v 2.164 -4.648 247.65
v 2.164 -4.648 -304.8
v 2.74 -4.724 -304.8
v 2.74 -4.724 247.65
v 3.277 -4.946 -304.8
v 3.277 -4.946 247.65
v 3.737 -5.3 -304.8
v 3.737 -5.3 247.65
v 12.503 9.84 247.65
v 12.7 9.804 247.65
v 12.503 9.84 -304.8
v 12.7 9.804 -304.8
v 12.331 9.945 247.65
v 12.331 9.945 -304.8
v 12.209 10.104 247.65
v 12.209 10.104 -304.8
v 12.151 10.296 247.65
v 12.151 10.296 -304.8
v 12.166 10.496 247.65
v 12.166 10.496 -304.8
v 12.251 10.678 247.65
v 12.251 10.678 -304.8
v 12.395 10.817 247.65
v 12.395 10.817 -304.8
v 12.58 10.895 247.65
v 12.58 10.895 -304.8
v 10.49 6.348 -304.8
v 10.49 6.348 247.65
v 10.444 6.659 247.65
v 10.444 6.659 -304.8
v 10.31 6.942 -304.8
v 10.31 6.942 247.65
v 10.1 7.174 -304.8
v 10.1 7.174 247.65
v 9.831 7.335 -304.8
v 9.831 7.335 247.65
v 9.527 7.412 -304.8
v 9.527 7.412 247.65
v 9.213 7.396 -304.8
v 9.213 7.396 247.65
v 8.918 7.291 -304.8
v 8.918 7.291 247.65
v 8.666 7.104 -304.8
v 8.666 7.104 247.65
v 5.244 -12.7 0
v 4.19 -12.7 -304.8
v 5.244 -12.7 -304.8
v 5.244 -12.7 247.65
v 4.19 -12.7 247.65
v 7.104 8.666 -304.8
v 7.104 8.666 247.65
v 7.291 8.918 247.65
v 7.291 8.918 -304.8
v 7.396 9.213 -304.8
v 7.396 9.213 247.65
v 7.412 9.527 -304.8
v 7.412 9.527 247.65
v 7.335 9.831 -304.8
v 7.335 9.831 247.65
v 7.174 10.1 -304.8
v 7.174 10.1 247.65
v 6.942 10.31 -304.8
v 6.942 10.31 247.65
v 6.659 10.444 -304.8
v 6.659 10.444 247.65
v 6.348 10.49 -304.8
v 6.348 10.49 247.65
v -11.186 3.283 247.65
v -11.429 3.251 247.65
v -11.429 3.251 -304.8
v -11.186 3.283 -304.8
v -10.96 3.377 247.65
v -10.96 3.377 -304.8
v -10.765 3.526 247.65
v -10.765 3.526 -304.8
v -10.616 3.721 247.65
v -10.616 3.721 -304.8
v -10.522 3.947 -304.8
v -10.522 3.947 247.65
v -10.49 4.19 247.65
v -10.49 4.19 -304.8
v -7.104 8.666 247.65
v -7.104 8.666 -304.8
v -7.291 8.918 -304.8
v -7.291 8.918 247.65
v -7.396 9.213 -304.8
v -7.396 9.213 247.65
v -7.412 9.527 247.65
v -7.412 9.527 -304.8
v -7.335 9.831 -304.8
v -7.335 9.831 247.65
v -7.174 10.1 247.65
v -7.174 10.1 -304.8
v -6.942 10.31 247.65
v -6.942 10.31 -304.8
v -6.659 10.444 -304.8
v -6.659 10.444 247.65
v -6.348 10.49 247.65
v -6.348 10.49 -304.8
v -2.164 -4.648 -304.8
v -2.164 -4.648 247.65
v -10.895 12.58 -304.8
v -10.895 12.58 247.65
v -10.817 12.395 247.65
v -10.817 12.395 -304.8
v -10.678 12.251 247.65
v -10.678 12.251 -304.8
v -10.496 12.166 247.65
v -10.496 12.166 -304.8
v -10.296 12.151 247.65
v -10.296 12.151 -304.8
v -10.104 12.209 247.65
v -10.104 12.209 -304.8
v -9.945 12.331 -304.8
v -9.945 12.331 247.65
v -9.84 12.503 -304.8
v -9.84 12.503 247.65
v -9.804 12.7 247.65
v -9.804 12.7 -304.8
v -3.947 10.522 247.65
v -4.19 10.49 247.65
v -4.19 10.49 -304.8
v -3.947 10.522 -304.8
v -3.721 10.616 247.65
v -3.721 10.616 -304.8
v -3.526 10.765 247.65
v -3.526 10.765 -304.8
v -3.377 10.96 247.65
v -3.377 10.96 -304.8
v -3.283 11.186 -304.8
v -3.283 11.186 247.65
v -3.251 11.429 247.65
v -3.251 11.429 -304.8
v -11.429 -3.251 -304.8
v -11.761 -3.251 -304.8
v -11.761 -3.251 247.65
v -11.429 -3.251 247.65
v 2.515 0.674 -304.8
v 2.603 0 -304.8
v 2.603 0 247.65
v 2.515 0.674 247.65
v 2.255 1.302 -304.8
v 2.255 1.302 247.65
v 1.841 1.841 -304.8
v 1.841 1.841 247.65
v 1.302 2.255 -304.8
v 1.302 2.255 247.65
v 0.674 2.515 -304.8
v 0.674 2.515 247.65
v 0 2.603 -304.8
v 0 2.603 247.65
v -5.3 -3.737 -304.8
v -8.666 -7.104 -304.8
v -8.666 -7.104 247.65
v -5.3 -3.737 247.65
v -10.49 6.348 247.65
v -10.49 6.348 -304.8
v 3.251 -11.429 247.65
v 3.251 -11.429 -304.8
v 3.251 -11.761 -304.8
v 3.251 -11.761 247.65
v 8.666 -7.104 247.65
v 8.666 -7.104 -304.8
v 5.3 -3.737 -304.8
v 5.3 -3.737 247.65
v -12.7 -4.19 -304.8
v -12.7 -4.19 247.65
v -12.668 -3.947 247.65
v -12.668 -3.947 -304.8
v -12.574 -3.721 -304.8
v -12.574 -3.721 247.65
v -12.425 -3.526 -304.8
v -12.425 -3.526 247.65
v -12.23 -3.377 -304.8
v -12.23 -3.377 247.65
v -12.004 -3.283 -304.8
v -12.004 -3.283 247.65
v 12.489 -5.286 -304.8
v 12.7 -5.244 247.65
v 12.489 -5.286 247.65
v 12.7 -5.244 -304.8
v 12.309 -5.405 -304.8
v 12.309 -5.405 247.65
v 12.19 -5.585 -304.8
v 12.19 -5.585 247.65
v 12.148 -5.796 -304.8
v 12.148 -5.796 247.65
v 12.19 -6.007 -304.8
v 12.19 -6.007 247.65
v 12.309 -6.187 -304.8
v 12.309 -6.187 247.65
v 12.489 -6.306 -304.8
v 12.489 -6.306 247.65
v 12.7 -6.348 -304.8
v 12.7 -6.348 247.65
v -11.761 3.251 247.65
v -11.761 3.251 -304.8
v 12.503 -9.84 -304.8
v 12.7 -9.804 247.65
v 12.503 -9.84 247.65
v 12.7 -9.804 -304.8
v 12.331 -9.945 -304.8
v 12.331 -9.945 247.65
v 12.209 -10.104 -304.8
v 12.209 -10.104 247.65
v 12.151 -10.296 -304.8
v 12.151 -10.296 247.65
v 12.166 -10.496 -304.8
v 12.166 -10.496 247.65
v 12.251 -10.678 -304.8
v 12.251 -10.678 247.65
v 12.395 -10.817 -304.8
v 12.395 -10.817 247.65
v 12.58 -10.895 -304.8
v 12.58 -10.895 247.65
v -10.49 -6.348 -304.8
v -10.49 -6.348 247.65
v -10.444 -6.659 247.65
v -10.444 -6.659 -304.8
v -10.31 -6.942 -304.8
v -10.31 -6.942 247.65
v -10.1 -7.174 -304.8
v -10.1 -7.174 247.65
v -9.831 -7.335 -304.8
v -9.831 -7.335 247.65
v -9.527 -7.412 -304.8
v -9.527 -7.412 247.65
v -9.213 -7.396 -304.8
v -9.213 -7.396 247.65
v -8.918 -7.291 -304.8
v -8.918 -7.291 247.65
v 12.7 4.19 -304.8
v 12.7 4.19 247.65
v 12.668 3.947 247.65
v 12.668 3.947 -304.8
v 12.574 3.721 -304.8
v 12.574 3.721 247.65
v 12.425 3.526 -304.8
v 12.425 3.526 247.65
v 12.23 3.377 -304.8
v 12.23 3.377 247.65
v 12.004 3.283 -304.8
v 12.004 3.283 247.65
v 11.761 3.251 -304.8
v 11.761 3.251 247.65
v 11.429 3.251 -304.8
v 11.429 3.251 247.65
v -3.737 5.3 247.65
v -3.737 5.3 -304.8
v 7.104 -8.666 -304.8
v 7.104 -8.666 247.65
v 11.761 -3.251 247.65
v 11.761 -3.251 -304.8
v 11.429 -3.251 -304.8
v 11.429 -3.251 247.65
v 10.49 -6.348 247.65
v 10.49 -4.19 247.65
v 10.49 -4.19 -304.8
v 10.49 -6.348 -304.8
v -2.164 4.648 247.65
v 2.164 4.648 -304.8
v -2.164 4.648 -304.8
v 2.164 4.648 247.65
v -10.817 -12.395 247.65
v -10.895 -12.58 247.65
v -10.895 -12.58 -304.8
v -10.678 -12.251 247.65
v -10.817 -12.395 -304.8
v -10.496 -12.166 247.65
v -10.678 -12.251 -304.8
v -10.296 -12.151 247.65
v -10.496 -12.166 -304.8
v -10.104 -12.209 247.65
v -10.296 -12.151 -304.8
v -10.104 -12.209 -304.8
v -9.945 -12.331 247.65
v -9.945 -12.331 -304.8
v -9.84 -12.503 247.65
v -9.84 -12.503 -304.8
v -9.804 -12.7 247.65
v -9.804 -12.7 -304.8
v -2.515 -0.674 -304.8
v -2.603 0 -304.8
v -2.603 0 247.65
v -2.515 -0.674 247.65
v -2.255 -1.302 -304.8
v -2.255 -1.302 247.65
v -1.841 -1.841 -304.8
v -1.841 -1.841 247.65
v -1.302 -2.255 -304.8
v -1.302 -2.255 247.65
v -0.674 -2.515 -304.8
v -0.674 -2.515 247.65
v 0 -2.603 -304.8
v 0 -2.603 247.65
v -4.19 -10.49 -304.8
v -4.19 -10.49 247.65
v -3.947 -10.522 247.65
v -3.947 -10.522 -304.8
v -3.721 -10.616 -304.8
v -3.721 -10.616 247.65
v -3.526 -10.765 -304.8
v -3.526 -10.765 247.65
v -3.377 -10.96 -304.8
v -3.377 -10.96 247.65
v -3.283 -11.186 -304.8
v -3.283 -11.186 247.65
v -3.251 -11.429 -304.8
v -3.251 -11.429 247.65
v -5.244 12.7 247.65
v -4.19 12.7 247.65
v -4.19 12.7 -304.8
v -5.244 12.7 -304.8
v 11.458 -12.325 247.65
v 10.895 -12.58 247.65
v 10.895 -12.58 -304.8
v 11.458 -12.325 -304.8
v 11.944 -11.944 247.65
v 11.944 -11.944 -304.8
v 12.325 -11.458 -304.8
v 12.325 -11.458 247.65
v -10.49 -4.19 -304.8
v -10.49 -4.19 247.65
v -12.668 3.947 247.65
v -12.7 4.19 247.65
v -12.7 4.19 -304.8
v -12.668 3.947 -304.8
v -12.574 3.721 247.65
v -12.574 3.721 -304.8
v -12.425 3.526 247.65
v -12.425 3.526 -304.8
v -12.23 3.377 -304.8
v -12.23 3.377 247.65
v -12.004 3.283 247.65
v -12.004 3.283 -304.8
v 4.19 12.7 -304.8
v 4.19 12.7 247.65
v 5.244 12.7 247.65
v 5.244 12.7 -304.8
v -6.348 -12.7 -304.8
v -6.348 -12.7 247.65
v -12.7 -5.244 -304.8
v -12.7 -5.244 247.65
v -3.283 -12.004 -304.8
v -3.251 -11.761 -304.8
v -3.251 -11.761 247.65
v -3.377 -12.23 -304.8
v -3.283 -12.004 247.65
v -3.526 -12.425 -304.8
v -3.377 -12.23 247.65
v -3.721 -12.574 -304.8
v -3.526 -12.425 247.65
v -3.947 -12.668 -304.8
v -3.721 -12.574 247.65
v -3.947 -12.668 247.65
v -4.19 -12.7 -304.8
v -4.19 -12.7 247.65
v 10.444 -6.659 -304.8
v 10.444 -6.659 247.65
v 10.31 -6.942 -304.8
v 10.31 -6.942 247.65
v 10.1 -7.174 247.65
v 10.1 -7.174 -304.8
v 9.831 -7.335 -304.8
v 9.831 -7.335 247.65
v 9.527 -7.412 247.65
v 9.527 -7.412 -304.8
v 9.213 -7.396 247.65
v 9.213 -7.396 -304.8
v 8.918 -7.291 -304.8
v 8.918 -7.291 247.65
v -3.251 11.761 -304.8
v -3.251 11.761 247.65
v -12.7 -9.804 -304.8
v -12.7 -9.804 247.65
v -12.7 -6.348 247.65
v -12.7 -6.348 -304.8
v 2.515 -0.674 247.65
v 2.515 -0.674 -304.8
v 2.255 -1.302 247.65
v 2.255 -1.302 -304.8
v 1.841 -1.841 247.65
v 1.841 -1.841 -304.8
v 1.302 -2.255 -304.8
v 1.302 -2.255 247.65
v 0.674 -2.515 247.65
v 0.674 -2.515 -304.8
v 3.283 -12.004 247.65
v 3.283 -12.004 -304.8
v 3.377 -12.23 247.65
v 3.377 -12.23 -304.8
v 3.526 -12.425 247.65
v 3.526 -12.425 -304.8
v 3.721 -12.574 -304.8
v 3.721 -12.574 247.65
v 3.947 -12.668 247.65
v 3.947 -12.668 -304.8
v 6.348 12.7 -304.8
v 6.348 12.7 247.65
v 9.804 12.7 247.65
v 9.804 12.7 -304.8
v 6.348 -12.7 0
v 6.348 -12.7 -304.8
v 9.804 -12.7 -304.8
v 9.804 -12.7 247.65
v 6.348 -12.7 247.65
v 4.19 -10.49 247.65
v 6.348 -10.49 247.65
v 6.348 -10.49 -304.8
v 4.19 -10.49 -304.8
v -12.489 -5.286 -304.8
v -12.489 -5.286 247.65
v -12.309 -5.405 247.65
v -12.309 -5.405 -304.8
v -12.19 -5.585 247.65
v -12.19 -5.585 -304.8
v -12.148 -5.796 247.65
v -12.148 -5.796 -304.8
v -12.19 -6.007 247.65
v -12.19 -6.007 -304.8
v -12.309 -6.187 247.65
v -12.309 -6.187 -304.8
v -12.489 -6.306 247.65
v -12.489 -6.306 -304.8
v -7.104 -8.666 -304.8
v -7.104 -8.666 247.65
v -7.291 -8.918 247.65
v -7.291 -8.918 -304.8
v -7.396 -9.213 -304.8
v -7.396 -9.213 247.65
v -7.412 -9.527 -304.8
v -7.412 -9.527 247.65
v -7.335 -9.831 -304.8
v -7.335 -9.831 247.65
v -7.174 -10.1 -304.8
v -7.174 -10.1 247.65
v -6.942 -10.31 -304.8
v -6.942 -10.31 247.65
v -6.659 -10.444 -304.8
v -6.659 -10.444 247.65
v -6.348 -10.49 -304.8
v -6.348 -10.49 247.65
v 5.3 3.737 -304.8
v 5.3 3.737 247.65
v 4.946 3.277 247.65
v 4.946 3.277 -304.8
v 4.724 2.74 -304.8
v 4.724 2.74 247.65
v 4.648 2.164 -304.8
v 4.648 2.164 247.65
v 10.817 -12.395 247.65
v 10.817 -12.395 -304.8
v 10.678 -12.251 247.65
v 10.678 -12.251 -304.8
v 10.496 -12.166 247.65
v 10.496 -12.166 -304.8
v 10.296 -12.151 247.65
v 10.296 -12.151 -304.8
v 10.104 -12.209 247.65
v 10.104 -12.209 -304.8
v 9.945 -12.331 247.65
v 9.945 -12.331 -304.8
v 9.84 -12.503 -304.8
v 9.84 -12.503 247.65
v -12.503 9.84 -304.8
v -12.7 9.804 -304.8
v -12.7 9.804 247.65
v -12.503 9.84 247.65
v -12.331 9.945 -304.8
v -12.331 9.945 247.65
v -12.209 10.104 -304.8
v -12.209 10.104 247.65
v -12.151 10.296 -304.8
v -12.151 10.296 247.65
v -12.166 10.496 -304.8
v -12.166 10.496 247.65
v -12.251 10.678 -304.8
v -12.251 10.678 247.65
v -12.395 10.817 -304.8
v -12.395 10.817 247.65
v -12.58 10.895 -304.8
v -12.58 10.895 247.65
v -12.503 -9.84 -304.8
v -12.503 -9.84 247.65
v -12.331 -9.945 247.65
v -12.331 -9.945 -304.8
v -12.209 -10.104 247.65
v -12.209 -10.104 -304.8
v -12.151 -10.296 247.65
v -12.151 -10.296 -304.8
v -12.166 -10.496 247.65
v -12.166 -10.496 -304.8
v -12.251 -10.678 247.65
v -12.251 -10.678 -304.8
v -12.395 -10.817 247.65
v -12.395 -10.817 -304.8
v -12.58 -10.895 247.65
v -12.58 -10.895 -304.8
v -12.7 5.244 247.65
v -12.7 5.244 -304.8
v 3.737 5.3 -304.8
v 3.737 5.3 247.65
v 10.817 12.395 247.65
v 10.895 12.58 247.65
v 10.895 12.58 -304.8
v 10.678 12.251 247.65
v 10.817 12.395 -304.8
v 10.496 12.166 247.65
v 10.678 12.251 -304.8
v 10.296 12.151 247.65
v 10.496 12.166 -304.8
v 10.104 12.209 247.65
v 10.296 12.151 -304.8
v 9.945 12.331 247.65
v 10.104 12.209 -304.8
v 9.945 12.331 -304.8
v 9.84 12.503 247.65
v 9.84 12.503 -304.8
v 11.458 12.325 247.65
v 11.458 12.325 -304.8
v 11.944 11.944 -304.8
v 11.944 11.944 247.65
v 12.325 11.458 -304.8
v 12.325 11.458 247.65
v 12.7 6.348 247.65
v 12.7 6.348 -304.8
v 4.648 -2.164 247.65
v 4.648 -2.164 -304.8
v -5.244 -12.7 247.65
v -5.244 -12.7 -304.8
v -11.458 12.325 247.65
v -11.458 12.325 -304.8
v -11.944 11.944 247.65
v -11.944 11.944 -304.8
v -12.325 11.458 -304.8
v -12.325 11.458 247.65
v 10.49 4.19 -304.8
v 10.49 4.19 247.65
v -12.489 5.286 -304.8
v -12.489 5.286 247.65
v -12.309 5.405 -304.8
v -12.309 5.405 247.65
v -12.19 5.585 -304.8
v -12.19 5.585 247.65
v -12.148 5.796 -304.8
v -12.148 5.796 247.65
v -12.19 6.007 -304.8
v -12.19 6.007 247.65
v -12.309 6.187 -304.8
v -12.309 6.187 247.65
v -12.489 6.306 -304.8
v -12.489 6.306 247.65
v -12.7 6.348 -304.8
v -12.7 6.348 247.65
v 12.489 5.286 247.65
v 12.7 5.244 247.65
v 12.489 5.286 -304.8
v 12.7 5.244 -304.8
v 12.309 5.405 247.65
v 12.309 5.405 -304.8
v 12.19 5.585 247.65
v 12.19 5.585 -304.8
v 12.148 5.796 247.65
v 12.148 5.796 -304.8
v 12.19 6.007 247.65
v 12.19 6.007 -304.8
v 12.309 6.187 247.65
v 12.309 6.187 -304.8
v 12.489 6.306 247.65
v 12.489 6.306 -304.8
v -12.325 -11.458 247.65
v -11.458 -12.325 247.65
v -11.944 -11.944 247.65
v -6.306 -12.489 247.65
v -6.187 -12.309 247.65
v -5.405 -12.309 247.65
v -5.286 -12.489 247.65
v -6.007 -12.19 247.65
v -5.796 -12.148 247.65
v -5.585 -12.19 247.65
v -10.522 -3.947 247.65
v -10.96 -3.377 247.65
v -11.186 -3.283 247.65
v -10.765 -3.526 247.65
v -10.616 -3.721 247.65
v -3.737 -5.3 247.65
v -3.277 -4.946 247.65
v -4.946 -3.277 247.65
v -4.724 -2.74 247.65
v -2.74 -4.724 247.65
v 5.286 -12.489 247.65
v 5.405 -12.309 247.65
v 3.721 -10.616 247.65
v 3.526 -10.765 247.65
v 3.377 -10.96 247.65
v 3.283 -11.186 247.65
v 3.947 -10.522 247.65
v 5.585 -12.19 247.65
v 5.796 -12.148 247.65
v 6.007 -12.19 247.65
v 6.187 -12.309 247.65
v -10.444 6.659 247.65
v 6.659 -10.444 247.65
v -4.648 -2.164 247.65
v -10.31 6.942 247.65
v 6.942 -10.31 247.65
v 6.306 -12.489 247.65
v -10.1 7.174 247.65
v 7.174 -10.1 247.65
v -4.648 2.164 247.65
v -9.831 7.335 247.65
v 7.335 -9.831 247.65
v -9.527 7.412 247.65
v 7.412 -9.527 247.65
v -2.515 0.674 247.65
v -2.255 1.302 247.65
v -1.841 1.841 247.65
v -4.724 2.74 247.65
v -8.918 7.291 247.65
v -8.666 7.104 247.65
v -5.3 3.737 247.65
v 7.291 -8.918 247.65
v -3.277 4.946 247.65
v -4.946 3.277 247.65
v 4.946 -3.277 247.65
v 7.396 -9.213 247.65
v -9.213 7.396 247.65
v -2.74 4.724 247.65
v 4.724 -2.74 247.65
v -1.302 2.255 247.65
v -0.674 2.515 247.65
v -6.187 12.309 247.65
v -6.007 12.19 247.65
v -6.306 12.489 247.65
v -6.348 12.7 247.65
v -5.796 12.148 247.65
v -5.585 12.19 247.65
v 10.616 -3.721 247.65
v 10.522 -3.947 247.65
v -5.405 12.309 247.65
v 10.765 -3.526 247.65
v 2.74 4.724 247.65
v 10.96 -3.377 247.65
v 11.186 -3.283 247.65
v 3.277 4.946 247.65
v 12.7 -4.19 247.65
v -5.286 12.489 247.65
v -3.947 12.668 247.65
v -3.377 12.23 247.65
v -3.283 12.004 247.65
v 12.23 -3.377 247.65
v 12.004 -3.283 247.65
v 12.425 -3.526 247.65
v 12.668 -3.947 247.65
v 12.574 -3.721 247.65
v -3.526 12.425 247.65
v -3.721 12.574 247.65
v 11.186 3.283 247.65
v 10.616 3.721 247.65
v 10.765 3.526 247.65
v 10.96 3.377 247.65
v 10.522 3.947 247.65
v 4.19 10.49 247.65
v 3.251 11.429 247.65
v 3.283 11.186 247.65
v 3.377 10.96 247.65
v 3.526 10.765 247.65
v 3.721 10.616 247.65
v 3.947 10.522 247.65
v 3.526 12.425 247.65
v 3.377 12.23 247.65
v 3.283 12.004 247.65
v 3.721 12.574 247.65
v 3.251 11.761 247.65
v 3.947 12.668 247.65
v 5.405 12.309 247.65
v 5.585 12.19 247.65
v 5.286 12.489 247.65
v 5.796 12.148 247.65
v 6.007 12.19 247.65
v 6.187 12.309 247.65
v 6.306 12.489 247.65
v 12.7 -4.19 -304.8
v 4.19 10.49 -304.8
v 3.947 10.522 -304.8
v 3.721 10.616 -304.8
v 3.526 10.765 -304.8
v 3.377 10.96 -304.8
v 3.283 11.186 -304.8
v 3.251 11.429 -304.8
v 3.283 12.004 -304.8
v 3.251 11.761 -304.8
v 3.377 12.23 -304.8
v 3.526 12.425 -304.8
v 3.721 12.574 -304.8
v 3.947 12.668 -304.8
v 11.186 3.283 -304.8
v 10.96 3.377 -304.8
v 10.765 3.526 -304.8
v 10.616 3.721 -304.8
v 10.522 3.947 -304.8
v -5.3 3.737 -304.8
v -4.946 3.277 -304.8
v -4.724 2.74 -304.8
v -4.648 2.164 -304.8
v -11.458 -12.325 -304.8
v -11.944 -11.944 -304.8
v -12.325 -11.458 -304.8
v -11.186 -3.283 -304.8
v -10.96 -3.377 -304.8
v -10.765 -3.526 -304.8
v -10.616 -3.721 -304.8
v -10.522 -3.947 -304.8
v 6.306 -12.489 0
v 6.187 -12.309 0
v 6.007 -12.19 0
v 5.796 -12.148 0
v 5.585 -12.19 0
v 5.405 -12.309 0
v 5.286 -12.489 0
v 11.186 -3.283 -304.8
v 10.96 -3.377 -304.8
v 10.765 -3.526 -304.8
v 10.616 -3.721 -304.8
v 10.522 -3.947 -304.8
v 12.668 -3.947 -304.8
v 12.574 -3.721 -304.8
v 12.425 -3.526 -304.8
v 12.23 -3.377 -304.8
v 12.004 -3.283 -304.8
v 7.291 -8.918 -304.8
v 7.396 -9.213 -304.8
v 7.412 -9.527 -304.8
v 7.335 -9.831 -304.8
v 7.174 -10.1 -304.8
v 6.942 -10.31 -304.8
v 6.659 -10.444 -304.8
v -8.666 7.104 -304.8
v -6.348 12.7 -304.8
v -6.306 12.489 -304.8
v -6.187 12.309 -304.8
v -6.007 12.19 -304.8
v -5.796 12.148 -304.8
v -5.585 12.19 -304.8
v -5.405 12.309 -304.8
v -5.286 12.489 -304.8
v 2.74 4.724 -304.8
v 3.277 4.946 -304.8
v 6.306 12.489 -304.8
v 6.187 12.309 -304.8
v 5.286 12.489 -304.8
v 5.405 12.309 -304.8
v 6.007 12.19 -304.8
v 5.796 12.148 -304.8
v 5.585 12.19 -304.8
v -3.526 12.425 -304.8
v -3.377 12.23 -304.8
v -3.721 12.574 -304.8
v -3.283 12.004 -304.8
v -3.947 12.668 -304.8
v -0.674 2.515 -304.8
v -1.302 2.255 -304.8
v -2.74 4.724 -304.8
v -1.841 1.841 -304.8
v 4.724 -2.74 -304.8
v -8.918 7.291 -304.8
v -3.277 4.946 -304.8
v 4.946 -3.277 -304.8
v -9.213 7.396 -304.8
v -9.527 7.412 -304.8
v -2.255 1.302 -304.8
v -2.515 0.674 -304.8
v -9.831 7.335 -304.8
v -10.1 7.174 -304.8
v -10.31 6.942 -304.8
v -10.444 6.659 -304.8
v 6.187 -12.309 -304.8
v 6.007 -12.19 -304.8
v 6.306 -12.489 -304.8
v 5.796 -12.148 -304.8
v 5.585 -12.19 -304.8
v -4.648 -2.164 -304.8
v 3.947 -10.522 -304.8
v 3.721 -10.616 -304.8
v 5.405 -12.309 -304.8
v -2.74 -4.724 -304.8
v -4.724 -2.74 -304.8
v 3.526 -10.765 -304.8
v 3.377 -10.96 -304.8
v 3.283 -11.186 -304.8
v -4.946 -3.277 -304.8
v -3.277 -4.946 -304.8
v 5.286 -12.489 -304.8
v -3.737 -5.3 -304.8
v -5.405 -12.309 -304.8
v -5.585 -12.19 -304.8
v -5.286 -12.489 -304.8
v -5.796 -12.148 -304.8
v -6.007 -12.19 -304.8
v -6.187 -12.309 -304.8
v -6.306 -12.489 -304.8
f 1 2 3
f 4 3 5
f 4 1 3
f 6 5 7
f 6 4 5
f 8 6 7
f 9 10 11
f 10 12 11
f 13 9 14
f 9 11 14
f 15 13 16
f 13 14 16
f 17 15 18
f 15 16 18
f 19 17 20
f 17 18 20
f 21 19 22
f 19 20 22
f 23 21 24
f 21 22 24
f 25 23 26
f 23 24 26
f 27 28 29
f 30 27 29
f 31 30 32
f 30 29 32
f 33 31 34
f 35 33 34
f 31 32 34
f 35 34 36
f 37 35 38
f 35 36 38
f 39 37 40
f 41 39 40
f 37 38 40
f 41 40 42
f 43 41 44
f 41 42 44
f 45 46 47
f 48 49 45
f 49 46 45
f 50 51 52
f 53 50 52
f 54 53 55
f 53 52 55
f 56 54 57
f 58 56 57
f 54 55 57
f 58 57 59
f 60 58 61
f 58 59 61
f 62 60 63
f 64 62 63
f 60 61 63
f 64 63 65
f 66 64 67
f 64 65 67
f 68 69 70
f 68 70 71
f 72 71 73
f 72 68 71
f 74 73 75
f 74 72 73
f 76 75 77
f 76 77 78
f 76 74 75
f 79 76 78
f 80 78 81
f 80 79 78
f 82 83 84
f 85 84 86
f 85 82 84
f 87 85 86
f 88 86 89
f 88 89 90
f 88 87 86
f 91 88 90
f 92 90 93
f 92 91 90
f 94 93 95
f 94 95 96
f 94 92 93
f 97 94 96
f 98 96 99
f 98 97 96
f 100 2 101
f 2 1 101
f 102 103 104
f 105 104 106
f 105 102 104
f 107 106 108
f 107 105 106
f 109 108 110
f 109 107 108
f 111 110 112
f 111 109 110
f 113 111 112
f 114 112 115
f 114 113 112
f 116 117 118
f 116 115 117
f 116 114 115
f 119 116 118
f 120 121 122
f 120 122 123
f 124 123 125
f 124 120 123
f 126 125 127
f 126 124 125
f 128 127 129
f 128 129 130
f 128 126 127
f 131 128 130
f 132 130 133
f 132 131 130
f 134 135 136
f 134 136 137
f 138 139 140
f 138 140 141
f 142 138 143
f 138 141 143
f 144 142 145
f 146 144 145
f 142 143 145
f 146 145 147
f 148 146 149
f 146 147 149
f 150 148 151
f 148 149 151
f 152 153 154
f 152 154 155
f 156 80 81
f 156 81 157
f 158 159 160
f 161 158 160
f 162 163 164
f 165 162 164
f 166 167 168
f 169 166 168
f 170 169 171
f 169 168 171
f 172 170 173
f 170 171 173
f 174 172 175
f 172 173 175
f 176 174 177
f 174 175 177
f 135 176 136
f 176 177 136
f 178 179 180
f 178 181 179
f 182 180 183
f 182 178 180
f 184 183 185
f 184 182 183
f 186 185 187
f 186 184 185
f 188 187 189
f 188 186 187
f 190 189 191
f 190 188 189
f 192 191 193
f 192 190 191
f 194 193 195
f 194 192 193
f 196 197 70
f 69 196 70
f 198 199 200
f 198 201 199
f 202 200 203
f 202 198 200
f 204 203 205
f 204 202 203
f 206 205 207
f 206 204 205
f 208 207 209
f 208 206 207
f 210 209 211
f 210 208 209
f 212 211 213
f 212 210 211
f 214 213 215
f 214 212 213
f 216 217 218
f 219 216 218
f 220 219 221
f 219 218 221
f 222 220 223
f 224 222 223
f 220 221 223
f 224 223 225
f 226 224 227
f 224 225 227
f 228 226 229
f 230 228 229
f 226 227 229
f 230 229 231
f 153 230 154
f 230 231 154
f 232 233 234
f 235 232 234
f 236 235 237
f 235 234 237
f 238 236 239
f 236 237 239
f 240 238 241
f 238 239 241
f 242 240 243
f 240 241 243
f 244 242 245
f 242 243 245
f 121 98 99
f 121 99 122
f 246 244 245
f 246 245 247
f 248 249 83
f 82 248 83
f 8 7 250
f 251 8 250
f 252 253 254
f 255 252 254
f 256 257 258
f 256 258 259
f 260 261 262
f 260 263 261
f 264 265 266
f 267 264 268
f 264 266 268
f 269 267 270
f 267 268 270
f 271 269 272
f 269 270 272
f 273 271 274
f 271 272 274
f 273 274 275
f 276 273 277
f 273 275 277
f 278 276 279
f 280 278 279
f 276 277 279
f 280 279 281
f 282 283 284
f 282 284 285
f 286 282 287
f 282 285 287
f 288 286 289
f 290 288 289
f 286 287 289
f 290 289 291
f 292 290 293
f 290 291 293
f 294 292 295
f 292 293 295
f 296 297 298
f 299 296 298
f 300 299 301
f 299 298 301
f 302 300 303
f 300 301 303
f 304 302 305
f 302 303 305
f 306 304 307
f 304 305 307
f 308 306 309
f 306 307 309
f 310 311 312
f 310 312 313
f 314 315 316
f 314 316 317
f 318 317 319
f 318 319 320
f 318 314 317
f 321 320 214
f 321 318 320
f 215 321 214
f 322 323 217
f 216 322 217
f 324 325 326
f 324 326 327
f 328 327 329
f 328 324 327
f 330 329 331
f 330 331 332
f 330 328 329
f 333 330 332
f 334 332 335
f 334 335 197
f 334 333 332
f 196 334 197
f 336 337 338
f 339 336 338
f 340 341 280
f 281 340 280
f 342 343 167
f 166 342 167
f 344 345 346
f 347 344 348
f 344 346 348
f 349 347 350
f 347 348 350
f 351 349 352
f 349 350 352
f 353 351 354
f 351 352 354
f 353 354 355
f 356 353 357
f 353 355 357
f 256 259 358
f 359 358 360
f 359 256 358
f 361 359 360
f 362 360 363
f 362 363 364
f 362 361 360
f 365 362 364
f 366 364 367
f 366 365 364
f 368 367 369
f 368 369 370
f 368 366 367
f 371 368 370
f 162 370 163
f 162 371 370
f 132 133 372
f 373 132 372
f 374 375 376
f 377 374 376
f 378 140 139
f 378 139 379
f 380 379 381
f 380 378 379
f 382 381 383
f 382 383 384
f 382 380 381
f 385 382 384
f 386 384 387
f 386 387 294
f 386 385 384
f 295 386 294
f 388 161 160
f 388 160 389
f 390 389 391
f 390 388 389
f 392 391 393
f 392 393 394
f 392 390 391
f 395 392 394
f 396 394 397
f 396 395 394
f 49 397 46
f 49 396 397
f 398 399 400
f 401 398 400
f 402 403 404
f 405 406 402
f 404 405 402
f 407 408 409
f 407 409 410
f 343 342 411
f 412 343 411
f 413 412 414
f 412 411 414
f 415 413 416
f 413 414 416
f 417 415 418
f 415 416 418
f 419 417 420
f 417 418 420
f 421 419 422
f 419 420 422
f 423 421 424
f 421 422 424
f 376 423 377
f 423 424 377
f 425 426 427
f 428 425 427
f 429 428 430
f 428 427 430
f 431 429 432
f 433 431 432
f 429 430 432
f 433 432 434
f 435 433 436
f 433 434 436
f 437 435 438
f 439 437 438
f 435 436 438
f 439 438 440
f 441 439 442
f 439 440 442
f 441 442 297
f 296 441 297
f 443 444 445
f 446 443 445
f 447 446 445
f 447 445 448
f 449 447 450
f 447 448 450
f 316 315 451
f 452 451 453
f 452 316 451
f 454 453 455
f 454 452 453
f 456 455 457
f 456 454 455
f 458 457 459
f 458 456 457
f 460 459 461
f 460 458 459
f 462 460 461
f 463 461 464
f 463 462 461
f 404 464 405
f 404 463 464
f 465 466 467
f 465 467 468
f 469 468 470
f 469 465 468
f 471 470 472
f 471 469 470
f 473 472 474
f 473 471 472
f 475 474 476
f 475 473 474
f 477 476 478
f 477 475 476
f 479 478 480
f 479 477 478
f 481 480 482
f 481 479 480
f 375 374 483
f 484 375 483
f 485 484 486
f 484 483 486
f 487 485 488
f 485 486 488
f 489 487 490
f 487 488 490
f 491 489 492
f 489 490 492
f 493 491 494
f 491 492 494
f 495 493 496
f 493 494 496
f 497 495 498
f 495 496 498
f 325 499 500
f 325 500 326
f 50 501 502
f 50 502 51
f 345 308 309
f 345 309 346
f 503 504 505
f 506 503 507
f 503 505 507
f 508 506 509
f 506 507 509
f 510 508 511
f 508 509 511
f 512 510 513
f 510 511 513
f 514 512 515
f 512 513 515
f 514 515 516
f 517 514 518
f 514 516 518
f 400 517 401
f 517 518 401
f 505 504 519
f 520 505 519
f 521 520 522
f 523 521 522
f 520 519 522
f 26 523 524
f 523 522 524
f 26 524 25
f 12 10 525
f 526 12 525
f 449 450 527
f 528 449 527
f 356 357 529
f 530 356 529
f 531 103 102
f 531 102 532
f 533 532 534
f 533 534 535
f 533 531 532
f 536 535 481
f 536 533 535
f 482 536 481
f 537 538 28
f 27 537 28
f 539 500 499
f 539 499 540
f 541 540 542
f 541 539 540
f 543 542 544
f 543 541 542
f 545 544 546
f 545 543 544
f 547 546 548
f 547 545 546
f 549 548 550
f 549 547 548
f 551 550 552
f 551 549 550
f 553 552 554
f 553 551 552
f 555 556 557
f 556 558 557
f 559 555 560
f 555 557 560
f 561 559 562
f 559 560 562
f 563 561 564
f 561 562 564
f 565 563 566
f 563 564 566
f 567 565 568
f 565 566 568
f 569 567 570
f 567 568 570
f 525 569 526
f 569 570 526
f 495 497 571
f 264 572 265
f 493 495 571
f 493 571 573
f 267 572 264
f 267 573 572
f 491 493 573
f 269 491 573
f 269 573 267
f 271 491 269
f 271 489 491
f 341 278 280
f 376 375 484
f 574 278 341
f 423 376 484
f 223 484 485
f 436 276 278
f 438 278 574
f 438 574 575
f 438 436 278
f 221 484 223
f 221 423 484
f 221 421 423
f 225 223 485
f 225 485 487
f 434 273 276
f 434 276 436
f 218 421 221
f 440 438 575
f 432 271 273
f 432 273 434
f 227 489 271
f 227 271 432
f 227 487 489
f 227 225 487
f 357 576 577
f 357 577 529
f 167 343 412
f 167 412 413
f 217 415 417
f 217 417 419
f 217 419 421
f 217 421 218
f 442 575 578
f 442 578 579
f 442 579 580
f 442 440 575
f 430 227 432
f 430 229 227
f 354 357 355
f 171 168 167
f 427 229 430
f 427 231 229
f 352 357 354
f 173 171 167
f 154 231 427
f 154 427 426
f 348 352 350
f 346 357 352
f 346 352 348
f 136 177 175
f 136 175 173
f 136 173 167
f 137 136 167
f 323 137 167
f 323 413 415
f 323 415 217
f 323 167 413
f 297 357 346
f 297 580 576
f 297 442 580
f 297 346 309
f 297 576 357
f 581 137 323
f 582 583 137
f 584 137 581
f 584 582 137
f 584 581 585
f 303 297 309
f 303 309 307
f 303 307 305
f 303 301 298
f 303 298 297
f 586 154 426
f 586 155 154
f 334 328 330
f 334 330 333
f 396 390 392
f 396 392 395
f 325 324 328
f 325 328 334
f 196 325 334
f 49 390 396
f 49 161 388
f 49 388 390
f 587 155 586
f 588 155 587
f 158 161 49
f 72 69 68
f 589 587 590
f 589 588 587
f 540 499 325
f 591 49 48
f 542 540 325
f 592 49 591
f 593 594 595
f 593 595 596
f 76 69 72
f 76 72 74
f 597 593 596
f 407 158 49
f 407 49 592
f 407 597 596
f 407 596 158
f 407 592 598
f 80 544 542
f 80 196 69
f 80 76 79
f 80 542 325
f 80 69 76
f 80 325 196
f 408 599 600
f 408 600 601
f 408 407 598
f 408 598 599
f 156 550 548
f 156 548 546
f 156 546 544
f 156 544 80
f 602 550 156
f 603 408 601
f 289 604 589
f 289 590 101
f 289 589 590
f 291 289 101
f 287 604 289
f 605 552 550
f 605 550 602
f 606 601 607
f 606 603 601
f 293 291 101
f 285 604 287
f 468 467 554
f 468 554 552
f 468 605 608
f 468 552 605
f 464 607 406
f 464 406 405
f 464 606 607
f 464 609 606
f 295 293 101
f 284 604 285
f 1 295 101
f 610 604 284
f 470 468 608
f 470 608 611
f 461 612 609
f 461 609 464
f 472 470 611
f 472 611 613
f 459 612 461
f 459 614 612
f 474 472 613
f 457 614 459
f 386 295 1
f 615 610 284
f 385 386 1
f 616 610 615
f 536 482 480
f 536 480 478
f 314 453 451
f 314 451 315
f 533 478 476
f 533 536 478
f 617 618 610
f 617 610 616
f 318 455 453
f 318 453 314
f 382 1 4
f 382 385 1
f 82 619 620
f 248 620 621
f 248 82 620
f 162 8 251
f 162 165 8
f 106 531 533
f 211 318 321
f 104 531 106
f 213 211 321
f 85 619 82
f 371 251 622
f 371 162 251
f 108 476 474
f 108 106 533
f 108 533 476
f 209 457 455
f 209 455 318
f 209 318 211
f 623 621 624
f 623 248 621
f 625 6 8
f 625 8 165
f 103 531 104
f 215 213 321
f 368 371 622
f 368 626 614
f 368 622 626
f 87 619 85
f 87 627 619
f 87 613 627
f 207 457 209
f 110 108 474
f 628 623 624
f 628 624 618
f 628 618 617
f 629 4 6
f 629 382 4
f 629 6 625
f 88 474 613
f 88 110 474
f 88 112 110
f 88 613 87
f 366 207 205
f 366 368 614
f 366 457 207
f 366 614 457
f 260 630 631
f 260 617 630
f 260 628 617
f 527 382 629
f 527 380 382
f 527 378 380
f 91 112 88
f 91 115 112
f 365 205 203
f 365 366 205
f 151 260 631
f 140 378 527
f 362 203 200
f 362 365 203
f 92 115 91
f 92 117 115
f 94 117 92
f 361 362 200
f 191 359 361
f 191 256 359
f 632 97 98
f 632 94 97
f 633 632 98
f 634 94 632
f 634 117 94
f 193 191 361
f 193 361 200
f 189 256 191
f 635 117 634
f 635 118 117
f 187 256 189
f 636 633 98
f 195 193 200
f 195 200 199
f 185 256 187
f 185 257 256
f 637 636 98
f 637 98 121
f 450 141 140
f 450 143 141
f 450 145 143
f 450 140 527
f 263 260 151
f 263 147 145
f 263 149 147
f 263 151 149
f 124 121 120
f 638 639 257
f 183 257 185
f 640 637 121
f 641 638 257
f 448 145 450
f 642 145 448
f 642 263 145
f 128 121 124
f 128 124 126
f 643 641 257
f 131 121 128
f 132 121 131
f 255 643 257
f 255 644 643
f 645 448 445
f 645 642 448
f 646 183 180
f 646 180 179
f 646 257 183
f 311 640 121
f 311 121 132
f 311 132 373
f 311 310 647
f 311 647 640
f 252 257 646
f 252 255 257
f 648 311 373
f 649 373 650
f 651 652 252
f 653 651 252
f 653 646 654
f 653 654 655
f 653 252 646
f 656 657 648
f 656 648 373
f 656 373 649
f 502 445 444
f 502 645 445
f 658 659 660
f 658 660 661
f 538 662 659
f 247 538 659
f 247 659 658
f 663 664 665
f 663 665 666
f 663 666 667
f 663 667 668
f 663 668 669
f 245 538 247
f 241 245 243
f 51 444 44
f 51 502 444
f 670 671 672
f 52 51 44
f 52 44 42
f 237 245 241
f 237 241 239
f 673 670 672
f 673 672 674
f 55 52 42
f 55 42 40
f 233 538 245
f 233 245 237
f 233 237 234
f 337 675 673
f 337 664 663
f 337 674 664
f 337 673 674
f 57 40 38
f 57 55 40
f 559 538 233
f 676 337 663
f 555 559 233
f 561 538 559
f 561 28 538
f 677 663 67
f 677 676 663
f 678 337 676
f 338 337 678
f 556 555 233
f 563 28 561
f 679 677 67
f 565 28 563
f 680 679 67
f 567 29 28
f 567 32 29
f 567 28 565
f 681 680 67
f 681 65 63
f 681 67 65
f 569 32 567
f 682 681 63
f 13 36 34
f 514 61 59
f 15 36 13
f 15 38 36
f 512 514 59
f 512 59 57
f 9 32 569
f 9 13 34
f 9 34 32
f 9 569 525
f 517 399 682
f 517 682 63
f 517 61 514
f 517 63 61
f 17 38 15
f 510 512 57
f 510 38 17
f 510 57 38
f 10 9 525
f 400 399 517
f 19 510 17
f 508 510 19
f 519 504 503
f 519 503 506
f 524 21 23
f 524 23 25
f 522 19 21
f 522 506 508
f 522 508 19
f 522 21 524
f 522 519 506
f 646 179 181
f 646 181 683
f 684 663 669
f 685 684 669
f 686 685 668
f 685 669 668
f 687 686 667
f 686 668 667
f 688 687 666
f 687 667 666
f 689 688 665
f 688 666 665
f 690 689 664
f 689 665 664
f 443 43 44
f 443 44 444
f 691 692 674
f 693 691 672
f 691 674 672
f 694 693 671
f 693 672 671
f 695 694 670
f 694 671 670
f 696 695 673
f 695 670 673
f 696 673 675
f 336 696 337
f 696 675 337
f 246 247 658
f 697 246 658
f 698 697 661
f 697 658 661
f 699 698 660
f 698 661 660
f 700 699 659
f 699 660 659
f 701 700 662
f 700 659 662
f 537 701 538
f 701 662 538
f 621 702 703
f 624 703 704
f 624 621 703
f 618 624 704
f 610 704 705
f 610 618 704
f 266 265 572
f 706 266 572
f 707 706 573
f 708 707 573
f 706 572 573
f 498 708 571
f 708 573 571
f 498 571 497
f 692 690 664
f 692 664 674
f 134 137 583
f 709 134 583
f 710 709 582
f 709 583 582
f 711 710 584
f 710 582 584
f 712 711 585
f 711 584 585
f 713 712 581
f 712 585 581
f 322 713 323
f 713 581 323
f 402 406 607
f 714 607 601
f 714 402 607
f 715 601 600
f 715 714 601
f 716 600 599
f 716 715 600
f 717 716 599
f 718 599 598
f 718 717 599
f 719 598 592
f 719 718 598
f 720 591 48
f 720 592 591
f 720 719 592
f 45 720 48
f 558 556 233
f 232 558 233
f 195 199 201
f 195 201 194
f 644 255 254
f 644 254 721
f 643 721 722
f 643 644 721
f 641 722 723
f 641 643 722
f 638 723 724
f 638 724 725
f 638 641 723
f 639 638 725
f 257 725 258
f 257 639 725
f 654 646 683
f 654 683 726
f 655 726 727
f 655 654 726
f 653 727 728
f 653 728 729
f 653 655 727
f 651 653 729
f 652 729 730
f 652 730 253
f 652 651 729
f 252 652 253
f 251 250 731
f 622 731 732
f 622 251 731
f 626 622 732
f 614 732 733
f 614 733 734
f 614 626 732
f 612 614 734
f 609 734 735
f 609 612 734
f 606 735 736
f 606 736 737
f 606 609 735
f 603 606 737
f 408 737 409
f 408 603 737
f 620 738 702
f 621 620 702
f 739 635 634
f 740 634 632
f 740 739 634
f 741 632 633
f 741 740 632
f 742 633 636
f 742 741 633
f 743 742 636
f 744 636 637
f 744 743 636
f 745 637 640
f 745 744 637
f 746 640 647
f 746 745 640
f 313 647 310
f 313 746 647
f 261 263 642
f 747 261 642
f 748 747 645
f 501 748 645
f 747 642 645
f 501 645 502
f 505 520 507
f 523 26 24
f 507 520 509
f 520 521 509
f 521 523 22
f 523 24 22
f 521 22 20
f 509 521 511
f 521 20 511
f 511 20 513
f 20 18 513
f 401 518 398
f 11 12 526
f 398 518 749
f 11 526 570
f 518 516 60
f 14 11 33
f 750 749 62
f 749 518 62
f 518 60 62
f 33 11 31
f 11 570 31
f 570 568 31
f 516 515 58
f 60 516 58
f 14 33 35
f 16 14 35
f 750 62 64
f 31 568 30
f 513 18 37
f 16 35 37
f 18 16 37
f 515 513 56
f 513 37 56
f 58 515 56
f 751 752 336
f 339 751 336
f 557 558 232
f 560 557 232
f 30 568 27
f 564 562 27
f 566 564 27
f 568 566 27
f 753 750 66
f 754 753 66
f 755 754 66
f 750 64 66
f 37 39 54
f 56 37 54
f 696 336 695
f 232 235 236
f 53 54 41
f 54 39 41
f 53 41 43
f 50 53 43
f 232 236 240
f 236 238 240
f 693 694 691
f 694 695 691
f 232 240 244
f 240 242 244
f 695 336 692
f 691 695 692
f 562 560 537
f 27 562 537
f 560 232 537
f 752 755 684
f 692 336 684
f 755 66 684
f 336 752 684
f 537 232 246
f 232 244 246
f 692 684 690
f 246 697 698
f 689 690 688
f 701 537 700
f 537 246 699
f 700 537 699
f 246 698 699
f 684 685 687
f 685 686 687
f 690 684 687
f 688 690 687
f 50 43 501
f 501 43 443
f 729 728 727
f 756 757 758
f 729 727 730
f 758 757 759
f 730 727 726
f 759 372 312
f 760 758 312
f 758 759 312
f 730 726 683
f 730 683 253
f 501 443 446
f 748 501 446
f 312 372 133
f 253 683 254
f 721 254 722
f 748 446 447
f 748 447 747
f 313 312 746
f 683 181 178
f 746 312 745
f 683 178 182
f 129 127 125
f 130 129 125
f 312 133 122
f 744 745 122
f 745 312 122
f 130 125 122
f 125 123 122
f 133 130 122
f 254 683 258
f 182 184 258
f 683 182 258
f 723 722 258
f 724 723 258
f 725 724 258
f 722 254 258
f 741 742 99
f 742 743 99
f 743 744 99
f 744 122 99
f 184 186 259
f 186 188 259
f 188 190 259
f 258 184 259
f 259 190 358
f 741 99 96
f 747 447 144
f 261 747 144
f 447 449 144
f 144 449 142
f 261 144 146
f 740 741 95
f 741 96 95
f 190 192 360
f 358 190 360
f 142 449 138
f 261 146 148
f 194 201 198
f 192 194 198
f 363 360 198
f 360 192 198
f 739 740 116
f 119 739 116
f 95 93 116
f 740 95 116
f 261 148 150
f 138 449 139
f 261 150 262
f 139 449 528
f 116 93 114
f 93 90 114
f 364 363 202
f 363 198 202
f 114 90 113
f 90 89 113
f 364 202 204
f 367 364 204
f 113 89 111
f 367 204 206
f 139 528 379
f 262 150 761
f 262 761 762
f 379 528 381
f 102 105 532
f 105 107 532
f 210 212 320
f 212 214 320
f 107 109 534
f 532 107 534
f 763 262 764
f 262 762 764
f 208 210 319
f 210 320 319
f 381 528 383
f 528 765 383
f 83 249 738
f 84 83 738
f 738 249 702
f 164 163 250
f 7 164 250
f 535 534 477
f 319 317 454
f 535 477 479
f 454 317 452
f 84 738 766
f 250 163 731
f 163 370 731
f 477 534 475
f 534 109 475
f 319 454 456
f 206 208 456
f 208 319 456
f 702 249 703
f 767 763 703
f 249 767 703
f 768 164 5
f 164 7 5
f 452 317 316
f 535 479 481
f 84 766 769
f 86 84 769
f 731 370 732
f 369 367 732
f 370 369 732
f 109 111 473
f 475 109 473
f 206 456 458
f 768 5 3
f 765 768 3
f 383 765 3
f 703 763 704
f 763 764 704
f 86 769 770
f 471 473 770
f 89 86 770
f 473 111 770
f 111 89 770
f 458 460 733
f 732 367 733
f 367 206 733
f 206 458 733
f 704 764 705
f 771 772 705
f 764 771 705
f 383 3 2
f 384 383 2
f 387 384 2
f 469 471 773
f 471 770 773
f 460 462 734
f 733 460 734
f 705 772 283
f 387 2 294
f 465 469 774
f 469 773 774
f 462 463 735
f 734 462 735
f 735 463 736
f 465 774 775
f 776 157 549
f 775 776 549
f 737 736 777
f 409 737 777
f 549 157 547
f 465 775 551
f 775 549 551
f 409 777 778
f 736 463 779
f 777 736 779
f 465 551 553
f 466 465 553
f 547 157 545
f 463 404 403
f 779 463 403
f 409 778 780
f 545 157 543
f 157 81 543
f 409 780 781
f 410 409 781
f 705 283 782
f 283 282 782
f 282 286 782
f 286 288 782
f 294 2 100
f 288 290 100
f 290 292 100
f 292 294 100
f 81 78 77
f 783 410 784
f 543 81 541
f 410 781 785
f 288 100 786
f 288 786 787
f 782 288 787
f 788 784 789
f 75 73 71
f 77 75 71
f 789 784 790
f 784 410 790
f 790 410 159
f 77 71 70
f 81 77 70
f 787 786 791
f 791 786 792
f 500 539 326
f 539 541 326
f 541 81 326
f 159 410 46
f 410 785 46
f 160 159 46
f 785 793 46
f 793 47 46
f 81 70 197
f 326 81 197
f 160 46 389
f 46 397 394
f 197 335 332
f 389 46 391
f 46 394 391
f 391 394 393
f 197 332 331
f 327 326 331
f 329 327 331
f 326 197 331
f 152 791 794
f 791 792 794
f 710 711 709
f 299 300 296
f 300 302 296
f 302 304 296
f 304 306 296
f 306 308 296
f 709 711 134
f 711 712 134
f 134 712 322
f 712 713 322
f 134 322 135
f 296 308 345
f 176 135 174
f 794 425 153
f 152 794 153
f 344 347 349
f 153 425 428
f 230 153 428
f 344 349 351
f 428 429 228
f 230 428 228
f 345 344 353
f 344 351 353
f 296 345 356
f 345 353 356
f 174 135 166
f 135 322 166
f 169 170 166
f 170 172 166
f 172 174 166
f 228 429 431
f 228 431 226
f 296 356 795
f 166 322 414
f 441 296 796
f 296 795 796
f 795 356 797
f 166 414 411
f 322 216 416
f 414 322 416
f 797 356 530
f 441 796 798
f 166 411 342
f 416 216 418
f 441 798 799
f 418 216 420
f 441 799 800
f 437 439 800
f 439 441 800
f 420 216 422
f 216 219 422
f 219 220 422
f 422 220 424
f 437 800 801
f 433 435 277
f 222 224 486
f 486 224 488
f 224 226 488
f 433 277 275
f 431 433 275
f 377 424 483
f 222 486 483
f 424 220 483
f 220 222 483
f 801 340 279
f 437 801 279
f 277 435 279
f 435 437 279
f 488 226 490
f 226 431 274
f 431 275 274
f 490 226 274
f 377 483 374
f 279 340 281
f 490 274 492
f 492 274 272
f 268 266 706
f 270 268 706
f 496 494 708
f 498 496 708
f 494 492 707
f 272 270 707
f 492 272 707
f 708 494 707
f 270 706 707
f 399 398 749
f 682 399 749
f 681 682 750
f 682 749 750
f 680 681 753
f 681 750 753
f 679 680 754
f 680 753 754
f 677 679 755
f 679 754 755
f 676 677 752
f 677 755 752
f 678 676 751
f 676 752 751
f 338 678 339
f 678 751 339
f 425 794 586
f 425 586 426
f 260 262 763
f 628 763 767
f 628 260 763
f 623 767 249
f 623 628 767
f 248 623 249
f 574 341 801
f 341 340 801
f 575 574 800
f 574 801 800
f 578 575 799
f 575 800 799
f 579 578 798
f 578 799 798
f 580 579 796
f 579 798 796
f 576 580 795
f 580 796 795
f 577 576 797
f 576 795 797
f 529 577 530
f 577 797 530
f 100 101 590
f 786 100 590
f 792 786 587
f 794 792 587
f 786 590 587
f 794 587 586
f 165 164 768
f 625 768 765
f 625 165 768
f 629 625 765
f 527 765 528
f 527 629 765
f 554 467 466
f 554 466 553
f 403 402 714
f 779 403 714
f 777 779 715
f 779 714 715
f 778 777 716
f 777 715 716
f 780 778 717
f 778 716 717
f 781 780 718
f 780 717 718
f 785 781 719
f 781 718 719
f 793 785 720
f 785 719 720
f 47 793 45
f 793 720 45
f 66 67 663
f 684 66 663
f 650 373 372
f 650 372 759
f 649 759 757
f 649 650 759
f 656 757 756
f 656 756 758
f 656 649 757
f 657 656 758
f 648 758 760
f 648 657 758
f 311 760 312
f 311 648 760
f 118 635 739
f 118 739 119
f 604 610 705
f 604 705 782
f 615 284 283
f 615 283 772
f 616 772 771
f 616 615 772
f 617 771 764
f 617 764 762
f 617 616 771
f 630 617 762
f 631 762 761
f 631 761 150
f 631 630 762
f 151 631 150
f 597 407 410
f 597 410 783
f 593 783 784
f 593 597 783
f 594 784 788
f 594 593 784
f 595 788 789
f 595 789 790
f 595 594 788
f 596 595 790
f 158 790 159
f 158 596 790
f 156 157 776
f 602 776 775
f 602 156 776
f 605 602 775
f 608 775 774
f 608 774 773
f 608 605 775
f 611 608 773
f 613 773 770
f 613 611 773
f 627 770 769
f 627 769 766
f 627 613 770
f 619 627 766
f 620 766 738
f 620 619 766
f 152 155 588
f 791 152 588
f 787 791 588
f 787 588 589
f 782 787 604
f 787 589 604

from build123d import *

# Parameters (mm, degrees)
BOSS_EXTRUDE1_DEPTH     = 304.8
SKETCH5_R               = 0.55245
CUT_EXTRUDE1_DEPTH      = 305.8
CUT_EXTRUDE1_DEPTH_BACK = 305.8
SKETCH6_W               = 31.75
SKETCH6_H               = 57.15
CUT_EXTRUDE2_DEPTH      = 12.7


with BuildPart() as part:
    # Sketch4 → Boss-Extrude1 (new body, symmetric)
    with BuildSketch(Plane.XY):
        with BuildLine():
            Line((4.190365, -12.7), (10.11729625, -12.7))
            ThreePointArc((10.11729625, -12.7), (11.943543585, -11.943543585), (12.7, -10.11729625))
            Line((12.7, -10.11729625), (12.7, -4.190365))
            ThreePointArc((12.7, -4.190365), (12.42492494, -3.52627506), (11.760835, -3.2512))
            Line((11.760835, -3.2512), (11.429365, -3.2512))
            ThreePointArc((11.429365, -3.2512), (10.76527506, -3.52627506), (10.4902, -4.190365))
            Line((10.4902, -4.190365), (10.4902, -6.348478019))
            ThreePointArc((10.4902, -6.348478019), (9.830707141, -7.335478831), (8.666460301, -7.103895736))
            Line((8.666460301, -7.103895736), (5.299899128, -3.737334563))
            ThreePointArc((5.299899128, -3.737334563), (4.817571085, -3.015479634), (4.6482, -2.16399369))
            Line((4.6482, -2.16399369), (4.6482, 0))
            Line((4.6482, 0), (2.6035, 0))
            ThreePointArc((2.6035, 0), (1.840952505, -1.840952505), (0, -2.6035))
            Line((0, -2.6035), (0, -4.6482))
            Line((0, -4.6482), (2.16399369, -4.6482))
            ThreePointArc((2.16399369, -4.6482), (3.015479634, -4.817571085), (3.737334563, -5.299899128))
            Line((3.737334563, -5.299899128), (7.103895736, -8.666460301))
            ThreePointArc((7.103895736, -8.666460301), (7.335478831, -9.830707141), (6.348478019, -10.4902))
            Line((6.348478019, -10.4902), (4.190365, -10.4902))
            ThreePointArc((4.190365, -10.4902), (3.52627506, -10.76527506), (3.2512, -11.429365))
            Line((3.2512, -11.429365), (3.2512, -11.760835))
            ThreePointArc((3.2512, -11.760835), (3.52627506, -12.42492494), (4.190365, -12.7))
        make_face()
    extrude(amount=BOSS_EXTRUDE1_DEPTH, both=True)

    # Sketch5 → Cut-Extrude1 (cut, two sides)
    with BuildSketch(Plane.XY) as cut_extrude1_sk:
        with Locations((10.356153152, -12.7)):
            Circle(SKETCH5_R)
        with Locations((5.796028019, -12.7)):
            Circle(SKETCH5_R)
        with Locations((12.7, -10.356153152)):
            Circle(SKETCH5_R)
        with Locations((12.7, -5.796028019)):
            Circle(SKETCH5_R)
    extrude(amount=CUT_EXTRUDE1_DEPTH, mode=Mode.SUBTRACT)
    extrude(cut_extrude1_sk.sketch, amount=-CUT_EXTRUDE1_DEPTH_BACK, mode=Mode.SUBTRACT)

    # Mirror1: part across plane


with BuildPart() as part_1:
    add(part.part)
    add(part.part.mirror(Plane(origin=(0, 0, 0), x_dir=(0, 0, 1), z_dir=(1, 0, 0))))

    # Mirror2: part across plane


with BuildPart() as part_2:
    add(part_1.part)
    add(part_1.part.mirror(Plane.ZX))

    # Sketch6 → Cut-Extrude2 (cut, symmetric)
    with BuildSketch(Plane(origin=(0, 0, 0), x_dir=(1, 0, 0), z_dir=(0, 1, 0))):
        with Locations((-0.060001566, -276.225)):
            Rectangle(SKETCH6_W, SKETCH6_H)
    extrude(amount=CUT_EXTRUDE2_DEPTH, both=True, mode=Mode.SUBTRACT)


solid = part_2.part
